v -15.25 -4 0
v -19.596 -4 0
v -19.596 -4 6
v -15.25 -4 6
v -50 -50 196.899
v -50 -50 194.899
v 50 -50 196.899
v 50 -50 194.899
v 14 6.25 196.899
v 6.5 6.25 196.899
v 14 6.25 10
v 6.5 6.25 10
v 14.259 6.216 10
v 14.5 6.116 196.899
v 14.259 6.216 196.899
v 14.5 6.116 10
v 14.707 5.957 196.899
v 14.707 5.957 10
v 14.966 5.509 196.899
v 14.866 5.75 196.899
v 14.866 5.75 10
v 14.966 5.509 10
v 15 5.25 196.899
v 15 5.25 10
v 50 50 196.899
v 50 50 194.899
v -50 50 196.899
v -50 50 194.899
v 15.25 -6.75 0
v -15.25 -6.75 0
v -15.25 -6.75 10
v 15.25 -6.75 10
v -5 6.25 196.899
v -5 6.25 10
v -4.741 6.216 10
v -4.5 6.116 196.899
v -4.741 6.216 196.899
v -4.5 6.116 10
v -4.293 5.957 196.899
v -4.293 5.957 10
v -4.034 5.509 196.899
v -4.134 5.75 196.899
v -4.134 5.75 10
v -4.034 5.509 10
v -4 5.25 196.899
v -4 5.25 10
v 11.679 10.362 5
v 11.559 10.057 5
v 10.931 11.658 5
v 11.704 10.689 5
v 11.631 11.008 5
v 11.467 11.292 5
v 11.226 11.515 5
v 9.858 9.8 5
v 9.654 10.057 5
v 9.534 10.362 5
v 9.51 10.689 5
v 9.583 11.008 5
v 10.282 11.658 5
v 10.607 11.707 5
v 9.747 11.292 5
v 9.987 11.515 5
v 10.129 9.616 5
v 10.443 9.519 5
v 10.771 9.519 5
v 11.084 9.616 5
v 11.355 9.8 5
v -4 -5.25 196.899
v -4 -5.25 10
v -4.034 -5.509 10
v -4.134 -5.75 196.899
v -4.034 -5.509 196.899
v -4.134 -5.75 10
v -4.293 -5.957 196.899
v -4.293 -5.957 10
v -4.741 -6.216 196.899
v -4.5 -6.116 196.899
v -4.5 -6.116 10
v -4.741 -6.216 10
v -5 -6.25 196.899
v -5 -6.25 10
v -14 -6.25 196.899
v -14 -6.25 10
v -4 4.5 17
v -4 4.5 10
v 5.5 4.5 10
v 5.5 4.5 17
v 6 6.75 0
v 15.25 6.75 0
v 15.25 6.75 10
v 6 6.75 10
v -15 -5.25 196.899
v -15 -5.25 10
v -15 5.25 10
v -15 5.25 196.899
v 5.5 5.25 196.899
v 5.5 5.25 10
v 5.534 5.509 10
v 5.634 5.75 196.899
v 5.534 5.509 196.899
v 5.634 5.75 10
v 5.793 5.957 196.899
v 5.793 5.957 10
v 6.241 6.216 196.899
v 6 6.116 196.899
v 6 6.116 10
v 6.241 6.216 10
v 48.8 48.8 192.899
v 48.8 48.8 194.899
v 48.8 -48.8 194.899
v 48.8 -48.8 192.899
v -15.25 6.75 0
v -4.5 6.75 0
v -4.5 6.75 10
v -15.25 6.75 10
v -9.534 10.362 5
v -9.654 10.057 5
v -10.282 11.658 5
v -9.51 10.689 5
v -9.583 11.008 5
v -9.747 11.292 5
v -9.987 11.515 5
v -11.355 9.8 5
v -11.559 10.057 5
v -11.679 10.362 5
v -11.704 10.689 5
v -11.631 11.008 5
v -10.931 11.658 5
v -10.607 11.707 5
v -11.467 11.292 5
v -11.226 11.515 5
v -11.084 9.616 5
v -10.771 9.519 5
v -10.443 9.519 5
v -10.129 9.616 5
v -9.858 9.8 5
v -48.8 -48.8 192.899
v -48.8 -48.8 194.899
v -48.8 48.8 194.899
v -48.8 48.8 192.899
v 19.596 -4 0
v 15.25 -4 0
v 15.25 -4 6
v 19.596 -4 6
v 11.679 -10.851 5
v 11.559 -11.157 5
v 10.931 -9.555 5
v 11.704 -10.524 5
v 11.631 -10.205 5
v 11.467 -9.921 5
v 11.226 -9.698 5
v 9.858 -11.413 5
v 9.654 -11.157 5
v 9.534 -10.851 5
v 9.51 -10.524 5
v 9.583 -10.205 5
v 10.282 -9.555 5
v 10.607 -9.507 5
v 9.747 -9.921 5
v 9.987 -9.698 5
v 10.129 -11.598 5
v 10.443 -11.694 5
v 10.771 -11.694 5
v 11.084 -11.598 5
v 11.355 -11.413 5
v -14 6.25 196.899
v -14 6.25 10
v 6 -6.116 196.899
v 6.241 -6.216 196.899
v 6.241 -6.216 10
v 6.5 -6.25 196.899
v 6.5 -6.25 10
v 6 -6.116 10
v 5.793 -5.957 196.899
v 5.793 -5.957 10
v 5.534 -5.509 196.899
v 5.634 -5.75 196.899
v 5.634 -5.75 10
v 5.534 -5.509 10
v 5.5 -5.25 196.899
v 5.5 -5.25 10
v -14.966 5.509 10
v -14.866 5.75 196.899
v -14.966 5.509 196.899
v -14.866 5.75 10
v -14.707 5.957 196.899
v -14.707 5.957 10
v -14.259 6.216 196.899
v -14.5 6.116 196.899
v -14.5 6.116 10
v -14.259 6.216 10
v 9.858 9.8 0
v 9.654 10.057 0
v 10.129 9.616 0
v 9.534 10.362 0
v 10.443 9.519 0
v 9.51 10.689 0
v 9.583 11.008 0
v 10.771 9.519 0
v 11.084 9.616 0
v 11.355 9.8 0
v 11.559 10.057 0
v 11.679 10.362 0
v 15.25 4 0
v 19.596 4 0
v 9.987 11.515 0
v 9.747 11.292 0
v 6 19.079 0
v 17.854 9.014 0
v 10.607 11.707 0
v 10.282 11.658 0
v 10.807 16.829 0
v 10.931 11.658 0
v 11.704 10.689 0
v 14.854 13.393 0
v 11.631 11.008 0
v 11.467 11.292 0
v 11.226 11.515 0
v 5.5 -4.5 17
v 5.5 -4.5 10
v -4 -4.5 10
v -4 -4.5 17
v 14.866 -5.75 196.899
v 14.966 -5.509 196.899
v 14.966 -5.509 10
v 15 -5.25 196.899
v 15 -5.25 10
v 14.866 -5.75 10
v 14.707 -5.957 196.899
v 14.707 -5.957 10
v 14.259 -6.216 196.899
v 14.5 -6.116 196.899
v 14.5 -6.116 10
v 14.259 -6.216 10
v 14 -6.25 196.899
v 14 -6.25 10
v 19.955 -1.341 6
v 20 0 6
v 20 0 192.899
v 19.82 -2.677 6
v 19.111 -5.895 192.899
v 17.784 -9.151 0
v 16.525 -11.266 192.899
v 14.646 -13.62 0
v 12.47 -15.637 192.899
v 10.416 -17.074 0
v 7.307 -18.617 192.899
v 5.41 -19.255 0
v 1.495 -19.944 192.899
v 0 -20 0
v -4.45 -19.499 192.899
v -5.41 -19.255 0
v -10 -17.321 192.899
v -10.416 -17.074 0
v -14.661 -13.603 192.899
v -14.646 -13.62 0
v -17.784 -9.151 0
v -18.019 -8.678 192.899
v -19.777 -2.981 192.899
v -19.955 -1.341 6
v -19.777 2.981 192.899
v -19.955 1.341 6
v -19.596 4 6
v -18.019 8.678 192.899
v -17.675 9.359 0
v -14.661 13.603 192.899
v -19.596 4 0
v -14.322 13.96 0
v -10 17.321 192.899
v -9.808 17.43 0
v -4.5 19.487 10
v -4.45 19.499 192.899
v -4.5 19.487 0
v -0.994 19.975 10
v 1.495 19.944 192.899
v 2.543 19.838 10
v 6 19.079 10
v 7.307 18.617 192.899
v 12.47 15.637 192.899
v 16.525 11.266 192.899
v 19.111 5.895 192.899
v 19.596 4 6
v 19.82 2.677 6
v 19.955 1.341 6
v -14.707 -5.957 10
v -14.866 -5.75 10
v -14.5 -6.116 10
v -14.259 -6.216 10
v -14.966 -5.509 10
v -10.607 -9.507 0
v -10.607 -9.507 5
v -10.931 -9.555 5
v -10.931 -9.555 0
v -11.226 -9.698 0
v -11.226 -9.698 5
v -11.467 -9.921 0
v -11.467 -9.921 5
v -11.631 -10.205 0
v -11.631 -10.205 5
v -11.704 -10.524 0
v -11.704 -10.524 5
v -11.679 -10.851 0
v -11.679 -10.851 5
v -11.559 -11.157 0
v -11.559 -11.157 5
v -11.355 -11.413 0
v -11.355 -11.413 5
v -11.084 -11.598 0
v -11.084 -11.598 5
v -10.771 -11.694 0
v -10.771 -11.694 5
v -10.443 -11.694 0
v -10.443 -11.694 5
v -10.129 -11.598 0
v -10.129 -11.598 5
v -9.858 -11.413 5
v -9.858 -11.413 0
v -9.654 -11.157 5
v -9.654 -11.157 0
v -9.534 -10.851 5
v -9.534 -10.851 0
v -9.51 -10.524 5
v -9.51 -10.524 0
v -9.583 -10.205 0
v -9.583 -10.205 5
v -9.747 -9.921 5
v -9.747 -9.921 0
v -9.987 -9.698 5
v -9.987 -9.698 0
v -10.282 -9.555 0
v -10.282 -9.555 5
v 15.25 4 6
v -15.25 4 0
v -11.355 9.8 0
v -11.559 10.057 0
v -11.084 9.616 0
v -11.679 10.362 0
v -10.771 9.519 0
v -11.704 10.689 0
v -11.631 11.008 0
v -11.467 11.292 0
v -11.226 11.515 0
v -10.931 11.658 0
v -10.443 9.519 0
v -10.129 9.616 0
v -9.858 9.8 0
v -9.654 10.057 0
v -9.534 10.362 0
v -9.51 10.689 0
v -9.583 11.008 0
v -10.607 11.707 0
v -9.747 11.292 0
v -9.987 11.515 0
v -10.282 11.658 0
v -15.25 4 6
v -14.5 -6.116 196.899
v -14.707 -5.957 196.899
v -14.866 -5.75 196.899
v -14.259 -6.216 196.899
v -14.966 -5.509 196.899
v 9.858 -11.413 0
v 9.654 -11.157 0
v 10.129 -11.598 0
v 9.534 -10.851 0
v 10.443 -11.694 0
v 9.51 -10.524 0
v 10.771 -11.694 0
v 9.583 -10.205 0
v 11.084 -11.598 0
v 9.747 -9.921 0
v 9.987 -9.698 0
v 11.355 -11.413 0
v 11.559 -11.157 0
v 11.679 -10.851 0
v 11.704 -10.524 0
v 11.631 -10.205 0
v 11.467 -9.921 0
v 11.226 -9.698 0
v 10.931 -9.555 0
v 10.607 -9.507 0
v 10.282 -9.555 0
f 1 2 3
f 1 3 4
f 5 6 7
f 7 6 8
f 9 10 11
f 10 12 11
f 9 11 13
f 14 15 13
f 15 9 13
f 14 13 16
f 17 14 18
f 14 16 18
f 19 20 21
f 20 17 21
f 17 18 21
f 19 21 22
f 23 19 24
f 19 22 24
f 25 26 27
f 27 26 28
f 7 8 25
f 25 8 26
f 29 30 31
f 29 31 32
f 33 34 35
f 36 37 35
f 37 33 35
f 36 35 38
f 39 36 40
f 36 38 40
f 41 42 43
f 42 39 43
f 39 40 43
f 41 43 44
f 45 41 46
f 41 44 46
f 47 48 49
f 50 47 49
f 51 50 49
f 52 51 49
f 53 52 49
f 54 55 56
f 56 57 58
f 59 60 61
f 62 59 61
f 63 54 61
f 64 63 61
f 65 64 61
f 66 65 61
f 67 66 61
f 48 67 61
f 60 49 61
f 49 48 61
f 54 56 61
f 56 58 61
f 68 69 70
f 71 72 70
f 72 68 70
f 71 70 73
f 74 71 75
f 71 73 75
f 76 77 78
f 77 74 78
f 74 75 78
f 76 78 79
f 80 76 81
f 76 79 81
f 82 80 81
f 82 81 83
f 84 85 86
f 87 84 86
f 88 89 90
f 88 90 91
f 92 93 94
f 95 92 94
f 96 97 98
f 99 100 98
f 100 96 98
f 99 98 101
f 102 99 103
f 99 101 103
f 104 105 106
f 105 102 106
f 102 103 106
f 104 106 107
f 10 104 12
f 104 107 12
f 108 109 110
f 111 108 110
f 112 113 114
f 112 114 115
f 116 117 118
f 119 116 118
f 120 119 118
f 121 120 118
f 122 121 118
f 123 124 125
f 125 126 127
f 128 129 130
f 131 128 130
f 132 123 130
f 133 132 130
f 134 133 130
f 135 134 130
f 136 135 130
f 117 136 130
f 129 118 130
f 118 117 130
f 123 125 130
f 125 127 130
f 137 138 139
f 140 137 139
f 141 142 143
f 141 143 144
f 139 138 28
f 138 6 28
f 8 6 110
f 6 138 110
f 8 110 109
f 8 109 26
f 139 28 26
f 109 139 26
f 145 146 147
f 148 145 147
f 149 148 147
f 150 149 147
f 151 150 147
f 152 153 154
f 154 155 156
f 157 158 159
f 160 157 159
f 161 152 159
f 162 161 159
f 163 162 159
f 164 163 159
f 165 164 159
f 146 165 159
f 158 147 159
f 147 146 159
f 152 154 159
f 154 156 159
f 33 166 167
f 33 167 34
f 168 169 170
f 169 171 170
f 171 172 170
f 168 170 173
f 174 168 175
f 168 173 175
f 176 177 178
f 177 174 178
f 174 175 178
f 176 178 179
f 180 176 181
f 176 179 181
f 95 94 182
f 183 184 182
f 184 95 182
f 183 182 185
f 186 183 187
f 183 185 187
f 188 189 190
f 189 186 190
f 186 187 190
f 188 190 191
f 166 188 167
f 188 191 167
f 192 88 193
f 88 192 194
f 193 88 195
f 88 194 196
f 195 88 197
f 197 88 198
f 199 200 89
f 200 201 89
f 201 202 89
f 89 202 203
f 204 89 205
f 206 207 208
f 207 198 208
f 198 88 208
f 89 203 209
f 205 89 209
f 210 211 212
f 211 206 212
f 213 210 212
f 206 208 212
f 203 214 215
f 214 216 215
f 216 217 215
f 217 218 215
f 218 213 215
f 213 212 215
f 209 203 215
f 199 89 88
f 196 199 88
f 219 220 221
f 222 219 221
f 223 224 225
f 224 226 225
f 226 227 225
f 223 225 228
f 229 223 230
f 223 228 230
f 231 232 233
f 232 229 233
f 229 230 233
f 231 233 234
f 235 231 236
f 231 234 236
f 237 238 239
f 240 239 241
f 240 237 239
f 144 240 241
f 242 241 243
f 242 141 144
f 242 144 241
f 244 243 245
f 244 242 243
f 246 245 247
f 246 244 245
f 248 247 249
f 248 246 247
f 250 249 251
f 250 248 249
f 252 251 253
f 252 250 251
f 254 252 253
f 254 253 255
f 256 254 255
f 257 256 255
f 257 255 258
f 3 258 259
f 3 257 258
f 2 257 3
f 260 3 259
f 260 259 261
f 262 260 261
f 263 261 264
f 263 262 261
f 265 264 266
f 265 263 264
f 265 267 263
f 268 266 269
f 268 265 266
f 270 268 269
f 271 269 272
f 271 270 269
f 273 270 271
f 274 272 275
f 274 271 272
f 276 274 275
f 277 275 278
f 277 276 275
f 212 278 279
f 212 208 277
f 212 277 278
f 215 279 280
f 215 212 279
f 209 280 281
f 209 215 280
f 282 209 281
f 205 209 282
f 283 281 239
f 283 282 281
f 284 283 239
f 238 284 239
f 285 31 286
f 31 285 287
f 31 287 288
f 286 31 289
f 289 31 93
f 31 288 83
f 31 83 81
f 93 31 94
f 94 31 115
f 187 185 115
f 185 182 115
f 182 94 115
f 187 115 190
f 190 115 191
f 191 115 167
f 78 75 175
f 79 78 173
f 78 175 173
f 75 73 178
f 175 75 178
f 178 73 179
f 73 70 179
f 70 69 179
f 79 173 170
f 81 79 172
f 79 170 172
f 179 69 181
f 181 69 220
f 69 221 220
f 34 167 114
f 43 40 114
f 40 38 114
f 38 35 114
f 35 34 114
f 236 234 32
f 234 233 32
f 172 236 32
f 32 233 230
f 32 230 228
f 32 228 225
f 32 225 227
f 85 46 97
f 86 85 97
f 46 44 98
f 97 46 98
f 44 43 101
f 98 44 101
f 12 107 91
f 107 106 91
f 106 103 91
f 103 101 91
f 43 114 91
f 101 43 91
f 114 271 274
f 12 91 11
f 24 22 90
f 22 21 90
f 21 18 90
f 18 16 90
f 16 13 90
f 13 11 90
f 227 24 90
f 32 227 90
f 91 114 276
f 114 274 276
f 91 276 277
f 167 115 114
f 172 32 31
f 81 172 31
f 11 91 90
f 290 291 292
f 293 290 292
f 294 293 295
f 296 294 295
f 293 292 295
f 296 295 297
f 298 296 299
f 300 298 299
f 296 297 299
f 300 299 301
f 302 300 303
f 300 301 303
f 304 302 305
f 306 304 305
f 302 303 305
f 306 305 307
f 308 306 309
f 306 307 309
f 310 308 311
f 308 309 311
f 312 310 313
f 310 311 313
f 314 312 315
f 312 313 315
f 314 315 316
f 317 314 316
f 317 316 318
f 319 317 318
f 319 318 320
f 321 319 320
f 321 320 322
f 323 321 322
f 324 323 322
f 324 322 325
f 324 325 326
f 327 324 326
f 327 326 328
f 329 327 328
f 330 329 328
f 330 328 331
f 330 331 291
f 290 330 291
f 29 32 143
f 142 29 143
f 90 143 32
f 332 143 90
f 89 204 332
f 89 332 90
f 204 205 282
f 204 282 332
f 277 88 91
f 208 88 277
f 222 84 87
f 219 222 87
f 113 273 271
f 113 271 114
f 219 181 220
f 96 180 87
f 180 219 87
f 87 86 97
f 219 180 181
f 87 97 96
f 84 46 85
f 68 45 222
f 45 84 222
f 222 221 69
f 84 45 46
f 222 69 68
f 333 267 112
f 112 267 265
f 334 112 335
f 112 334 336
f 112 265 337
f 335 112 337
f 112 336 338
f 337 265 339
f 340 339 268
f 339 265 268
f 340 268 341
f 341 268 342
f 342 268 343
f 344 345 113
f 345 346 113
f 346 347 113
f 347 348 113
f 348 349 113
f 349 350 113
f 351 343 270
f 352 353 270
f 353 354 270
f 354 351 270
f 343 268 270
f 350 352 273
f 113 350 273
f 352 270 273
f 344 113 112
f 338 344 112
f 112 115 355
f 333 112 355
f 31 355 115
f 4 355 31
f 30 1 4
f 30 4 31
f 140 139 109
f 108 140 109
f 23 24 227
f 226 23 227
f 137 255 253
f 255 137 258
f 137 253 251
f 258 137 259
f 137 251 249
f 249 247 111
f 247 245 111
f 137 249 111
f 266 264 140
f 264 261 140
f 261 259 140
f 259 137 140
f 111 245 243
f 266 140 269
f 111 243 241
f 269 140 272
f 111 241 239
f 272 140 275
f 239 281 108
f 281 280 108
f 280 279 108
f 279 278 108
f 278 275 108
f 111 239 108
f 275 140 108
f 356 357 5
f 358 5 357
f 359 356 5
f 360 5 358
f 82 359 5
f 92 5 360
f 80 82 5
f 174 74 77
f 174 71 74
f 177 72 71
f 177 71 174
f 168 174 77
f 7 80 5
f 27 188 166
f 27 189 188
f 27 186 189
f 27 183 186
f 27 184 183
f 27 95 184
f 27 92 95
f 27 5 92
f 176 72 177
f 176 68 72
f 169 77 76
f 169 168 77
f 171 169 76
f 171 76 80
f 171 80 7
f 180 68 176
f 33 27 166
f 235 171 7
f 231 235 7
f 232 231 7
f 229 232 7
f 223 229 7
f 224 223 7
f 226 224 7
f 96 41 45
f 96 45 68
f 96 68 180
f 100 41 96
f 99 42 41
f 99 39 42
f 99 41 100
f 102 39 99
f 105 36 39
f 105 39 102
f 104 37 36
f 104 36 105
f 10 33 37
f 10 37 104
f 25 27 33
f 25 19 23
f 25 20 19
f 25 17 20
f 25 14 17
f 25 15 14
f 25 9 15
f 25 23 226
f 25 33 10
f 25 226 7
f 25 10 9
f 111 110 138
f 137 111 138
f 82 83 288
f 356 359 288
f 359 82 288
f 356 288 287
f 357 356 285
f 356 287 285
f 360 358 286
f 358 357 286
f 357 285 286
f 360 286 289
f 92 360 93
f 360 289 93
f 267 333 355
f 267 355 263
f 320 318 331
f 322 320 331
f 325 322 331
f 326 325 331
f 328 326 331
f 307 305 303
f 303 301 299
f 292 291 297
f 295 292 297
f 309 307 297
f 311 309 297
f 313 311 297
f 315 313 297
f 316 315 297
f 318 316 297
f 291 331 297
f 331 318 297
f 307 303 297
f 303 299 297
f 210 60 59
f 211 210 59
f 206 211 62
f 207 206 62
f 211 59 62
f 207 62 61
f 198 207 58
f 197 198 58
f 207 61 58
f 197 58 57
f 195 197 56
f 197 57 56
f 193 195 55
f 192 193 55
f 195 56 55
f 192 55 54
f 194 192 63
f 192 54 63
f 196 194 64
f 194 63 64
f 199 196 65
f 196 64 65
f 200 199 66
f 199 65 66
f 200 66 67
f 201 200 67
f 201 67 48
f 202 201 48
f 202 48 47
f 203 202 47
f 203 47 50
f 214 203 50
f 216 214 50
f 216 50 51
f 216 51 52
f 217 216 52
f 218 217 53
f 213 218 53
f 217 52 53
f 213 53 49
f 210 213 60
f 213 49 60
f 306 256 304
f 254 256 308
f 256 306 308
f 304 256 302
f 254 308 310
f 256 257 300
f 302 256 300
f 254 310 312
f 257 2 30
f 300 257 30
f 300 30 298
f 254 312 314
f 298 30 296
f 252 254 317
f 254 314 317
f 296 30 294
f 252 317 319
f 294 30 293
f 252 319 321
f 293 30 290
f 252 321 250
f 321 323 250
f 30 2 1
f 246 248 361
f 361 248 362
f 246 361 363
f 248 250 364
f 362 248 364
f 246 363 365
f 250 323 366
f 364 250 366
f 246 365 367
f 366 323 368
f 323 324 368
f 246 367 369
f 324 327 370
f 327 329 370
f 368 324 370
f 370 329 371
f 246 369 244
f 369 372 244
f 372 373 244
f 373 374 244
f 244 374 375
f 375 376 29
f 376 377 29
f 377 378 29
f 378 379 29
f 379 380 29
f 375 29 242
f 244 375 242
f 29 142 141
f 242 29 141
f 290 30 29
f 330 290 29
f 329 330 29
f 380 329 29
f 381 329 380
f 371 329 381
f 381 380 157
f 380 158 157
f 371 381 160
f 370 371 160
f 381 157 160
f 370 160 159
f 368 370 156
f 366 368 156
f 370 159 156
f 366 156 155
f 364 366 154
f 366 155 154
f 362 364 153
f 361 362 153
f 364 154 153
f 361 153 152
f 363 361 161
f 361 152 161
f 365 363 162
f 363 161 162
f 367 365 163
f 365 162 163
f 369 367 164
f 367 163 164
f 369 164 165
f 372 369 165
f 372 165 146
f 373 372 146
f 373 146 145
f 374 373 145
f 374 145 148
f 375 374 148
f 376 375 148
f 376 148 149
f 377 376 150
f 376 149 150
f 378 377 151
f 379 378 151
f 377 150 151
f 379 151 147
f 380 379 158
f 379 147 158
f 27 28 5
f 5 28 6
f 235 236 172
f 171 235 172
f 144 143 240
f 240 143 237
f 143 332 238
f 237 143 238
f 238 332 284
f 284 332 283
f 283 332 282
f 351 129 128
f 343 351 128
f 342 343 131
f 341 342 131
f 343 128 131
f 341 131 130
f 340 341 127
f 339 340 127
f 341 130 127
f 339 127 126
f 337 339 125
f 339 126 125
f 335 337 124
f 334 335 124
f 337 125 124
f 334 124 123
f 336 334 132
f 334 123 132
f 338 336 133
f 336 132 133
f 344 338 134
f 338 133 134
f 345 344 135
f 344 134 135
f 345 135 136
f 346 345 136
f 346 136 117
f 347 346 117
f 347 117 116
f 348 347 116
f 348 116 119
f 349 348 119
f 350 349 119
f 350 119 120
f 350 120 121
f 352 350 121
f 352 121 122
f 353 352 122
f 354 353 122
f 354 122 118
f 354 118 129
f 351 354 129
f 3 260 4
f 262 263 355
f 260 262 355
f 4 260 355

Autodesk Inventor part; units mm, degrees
ref_plane "YZ Plane" through (0, 0, 0) normal (1, 0, 0) x (0, 1, 0)
ref_plane "XZ Plane" through (0, 0, 0) normal (0, 1, 0) x (-1, 0, 0)
ref_plane "XY Plane" through (0, 0, 0) normal (0, 0, 1) x (1, 0, 0)
sketch "Skizze1" plane through (0, 0, 0) normal (0, 0, 1) x (1, 0, 0)
  line L0 (-14, 6.25) -> (-5, 6.25)
  line L1 (-4, 5.25) -> (-4, -5.25)
  line L2 (-5, -6.25) -> (-14, -6.25)
  line L3 (-15, -5.25) -> (-15, 5.25)
  line L4 (-15, 6.25) -> (-4, -6.25) construction
  line L5 (-4, 6.25) -> (-15, -6.25) construction
  line L6 (6.5, 6.25) -> (14, 6.25)
  line L7 (15, 5.25) -> (15, -5.25)
  line L8 (14, -6.25) -> (6.5, -6.25)
  line L9 (5.5, -5.25) -> (5.5, 5.25)
  line L10 (5.5, 6.25) -> (15, -6.25) construction
  line L11 (15, 6.25) -> (5.5, -6.25) construction
  arc A0 (-15, -5.25) -> (-14, -6.25) centre (-14, -5.25) ccw
  arc A1 (-14, 6.25) -> (-15, 5.25) centre (-14, 5.25) ccw
  arc A2 (-4, 5.25) -> (-5, 6.25) centre (-5, 5.25) ccw
  arc A3 (-5, -6.25) -> (-4, -5.25) centre (-5, -5.25) ccw
  arc A4 (6.5, 6.25) -> (5.5, 5.25) centre (6.5, 5.25) ccw
  arc A5 (15, 5.25) -> (14, 6.25) centre (14, 5.25) ccw
  arc A6 (14, -6.25) -> (15, -5.25) centre (14, -5.25) ccw
  arc A7 (5.5, -5.25) -> (6.5, -6.25) centre (6.5, -5.25) ccw
  line L12 (-4, 4.5) -> (5.5, 4.5)
  line L13 (5.5, 4.5) -> (5.5, -4.5)
  line L14 (5.5, -4.5) -> (-4, -4.5)
  line L15 (-4, -4.5) -> (-4, 4.5)
  circle A8 centre (0, 0) radius 20
  line L16 (-15.25, -6.75) -> (15.25, -6.75)
  line L17 (15.25, -6.75) -> (15.25, 6.75)
  line L18 (15.25, 6.75) -> (-15.25, 6.75)
  line L19 (-15.25, 6.75) -> (-15.25, -6.75)
  line L20 (-15.25, -6.75) -> (15.25, 6.75) construction
  line L21 (15.25, -6.75) -> (-15.25, 6.75) construction
  line L22 (0, 6.75) -> (0, -6.75) construction
  line L23 (-28, 0) -> (28, 0) projected
  circle A9 centre (0, 0) radius 15 construction
  line L24 (10.6066, 10.6066) -> (-10.6066, -10.6066) construction
  line L25 (-10.6066, 10.6066) -> (10.6066, -10.6066) construction
  line L26 (6, 20) -> (-4.5, 20)
  line L27 (-4.5, 20) -> (-4.5, 4.5)
  line L28 (-4.5, 4.5) -> (6, 4.5)
  line L29 (6, 4.5) -> (6, 20)
  line L30 (20, 4) -> (15.25, 4)
  line L31 (15.25, 4) -> (15.25, -4)
  line L32 (15.25, -4) -> (20, -4)
  line L33 (20, -4) -> (20, 4)
  line L34 (-15.25, 4) -> (-20, 4)
  line L35 (-20, 4) -> (-20, -4)
  line L36 (-20, -4) -> (-15.25, -4)
  line L37 (-15.25, -4) -> (-15.25, 4)
  point P0 (-9.5, 0)
  point P1 (10.25, 0)
  point P2 (-9.5, 0)
  point P3 (10.25, 0)
  point P4 (-9.5, 0)
  point P5 (-4, 0)
  point P6 (5.5, 0)
  point P7 (10.25, 0)
  point P8 (0.75, 4.5)
  point P9 (0, 0)
  point P10 (0.75, 20)
  dimension "d5" = 12.5
  dimension "d6" = 11
  dimension "d7" = 9.5
  dimension "d9" = 1
  dimension "d10" = 1
  dimension "d12" = 9
  dimension "d14" = 40
  dimension "d15" = 13.5
  dimension "d16" = 30.5
  dimension "d17" = 30
  dimension "d18" = 9.5
  dimension "d47" = 30
  dimension "d48" = 90
  dimension "d49" = 45
  dimension "d50" = 10.5
  dimension "d55" = 8
extrude "Extrusion1" add sketch "Skizze1" along normal blind 194.899 contours A1 L3 L23 L19 L18 L27 A2 L0 | L27 L18 L29 A4 L9 L12 L1 A2 | L3 A0 L2 A3 L1 L14 L9 A7 L8 A6 L7 L23 L17 L16 L19 | L27 A8 L29 L18 | L18 L19 L34 A8 L27 | L23 A8 L34 L19 | L19 L36 A8 L23 | L23 L9 L14 L1 | L1 L12 L9 L23 | L29 A8 L30 L17 L18 | L18 L17 L23 L7 A5 L6 A4 L29 | L19 L16 L17 L32 A8 L36 | L30 A8 L23 L17 | L32 L17 L23 A8
extrude "Extrusion4" cut sketch "Skizze1" along normal blind 10 contours A1 L3 L23 L19 L18 L27 A2 L0 | L27 L18 L29 A4 L9 L12 L1 A2 | A2 L1 L28 L27 | L3 A0 L2 A3 L1 L14 L9 A7 L8 A6 L7 L23 L17 L16 L19 | L27 A8 L29 L18 | L23 L9 L14 L1 | L1 L12 L9 L23 | L18 L17 L23 L7 A5 L6 A4 L29 | L27 L26 A8 | L9 A4 L29 L28 | A8 L26 L29
extrude "Extrusion6" cut sketch "Skizze1" along normal blind 17 contours L23 L9 L14 L1 | L1 L12 L9 L23
extrude "Extrusion5" cut sketch "Skizze1" along normal blind 6 contours L23 A8 L34 L19 | L19 L36 A8 L23 | L35 L34 A8 | A8 L36 L35 | L30 A8 L23 L17 | L30 L33 A8 | L32 L17 L23 A8 | A8 L33 L32
sketch "Skizze2" plane through (0, 0, 194.899) normal (0, 0, 1) x (1, 0, 0)
  arc A0 (-15, -5.25) -> (-14, -6.25) centre (-14, -5.25) ccw projected
  line L0 (-15, -5.25) -> (-15, 5.25) projected
  arc A1 (-14, 6.25) -> (-15, 5.25) centre (-14, 5.25) ccw projected
  line L1 (-14, 6.25) -> (-5, 6.25) projected
  arc A2 (-4, 5.25) -> (-5, 6.25) centre (-5, 5.25) ccw projected
  line L2 (-4, 5.25) -> (-4, -5.25) projected
  arc A3 (-5, -6.25) -> (-4, -5.25) centre (-5, -5.25) ccw projected
  line L3 (-5, -6.25) -> (-14, -6.25) projected
  arc A4 (6.5, 6.25) -> (5.5, 5.25) centre (6.5, 5.25) ccw projected
  line L4 (6.5, 6.25) -> (14, 6.25) projected
  arc A5 (15, 5.25) -> (14, 6.25) centre (14, 5.25) ccw projected
  line L5 (15, 5.25) -> (15, -5.25) projected
  arc A6 (14, -6.25) -> (15, -5.25) centre (14, -5.25) ccw projected
  line L6 (14, -6.25) -> (6.5, -6.25) projected
  arc A7 (5.5, -5.25) -> (6.5, -6.25) centre (6.5, -5.25) ccw projected
  line L7 (5.5, -5.25) -> (5.5, 5.25) projected
  circle A8 centre (0, 0) radius 20 projected
  line L8 (-50, -50) -> (50, -50)
  line L9 (50, -50) -> (50, 50)
  line L10 (50, 50) -> (-50, 50)
  line L11 (-50, 50) -> (-50, -50)
  line L12 (-50, -50) -> (50, 50) construction
  line L13 (50, -50) -> (-50, 50) construction
  line L14 (-48.8, 48.8) -> (48.8, 48.8)
  line L15 (48.8, 48.8) -> (48.8, -48.8)
  line L16 (48.8, -48.8) -> (-48.8, -48.8)
  line L17 (-48.8, -48.8) -> (-48.8, 48.8)
  dimension "d19" = 100
  dimension "d20" = 100
  dimension "d21" = 1.2
extrude "Extrusion2" add sketch "Skizze2" along normal blind 2 contours A8 | L11 L10 L9 L8 | L14 L15 L16 L17
extrude "Extrusion3" add sketch "Skizze2" against normal blind 2 contours L14 L15 L16 L17
hole "Bohrung1" at (10.6066, 10.6066, 0) at (-10.6066, 10.6066, 0) at (-10.6066, -10.6066, 0) at (10.6066, -10.6066, 0) direction (0, 0, 1) diameter 2.2 depth 5
sketch "Skizze3" plane through (0, 0, 0) normal (0, 1, 0) x (-1, 0, 0)
  line L0 (20, 12) -> (20.5, 12)
  line L1 (20.5, 12) -> (20.5, 0)
  line L2 (20.5, 0) -> (20, 0)
  line L3 (20, 0) -> (20, 12)
  line L4 (20.6, 0) -> (19.9, 0) projected
  line L5 (0, -2.4) -> (0, 14.4) projected
  dimension "d26" = 12
  dimension "d27" = 0.5
  dimension "d37" = 40
equation "\"d20\" = d19"
properties part number "DayLightGlow_Rod"
